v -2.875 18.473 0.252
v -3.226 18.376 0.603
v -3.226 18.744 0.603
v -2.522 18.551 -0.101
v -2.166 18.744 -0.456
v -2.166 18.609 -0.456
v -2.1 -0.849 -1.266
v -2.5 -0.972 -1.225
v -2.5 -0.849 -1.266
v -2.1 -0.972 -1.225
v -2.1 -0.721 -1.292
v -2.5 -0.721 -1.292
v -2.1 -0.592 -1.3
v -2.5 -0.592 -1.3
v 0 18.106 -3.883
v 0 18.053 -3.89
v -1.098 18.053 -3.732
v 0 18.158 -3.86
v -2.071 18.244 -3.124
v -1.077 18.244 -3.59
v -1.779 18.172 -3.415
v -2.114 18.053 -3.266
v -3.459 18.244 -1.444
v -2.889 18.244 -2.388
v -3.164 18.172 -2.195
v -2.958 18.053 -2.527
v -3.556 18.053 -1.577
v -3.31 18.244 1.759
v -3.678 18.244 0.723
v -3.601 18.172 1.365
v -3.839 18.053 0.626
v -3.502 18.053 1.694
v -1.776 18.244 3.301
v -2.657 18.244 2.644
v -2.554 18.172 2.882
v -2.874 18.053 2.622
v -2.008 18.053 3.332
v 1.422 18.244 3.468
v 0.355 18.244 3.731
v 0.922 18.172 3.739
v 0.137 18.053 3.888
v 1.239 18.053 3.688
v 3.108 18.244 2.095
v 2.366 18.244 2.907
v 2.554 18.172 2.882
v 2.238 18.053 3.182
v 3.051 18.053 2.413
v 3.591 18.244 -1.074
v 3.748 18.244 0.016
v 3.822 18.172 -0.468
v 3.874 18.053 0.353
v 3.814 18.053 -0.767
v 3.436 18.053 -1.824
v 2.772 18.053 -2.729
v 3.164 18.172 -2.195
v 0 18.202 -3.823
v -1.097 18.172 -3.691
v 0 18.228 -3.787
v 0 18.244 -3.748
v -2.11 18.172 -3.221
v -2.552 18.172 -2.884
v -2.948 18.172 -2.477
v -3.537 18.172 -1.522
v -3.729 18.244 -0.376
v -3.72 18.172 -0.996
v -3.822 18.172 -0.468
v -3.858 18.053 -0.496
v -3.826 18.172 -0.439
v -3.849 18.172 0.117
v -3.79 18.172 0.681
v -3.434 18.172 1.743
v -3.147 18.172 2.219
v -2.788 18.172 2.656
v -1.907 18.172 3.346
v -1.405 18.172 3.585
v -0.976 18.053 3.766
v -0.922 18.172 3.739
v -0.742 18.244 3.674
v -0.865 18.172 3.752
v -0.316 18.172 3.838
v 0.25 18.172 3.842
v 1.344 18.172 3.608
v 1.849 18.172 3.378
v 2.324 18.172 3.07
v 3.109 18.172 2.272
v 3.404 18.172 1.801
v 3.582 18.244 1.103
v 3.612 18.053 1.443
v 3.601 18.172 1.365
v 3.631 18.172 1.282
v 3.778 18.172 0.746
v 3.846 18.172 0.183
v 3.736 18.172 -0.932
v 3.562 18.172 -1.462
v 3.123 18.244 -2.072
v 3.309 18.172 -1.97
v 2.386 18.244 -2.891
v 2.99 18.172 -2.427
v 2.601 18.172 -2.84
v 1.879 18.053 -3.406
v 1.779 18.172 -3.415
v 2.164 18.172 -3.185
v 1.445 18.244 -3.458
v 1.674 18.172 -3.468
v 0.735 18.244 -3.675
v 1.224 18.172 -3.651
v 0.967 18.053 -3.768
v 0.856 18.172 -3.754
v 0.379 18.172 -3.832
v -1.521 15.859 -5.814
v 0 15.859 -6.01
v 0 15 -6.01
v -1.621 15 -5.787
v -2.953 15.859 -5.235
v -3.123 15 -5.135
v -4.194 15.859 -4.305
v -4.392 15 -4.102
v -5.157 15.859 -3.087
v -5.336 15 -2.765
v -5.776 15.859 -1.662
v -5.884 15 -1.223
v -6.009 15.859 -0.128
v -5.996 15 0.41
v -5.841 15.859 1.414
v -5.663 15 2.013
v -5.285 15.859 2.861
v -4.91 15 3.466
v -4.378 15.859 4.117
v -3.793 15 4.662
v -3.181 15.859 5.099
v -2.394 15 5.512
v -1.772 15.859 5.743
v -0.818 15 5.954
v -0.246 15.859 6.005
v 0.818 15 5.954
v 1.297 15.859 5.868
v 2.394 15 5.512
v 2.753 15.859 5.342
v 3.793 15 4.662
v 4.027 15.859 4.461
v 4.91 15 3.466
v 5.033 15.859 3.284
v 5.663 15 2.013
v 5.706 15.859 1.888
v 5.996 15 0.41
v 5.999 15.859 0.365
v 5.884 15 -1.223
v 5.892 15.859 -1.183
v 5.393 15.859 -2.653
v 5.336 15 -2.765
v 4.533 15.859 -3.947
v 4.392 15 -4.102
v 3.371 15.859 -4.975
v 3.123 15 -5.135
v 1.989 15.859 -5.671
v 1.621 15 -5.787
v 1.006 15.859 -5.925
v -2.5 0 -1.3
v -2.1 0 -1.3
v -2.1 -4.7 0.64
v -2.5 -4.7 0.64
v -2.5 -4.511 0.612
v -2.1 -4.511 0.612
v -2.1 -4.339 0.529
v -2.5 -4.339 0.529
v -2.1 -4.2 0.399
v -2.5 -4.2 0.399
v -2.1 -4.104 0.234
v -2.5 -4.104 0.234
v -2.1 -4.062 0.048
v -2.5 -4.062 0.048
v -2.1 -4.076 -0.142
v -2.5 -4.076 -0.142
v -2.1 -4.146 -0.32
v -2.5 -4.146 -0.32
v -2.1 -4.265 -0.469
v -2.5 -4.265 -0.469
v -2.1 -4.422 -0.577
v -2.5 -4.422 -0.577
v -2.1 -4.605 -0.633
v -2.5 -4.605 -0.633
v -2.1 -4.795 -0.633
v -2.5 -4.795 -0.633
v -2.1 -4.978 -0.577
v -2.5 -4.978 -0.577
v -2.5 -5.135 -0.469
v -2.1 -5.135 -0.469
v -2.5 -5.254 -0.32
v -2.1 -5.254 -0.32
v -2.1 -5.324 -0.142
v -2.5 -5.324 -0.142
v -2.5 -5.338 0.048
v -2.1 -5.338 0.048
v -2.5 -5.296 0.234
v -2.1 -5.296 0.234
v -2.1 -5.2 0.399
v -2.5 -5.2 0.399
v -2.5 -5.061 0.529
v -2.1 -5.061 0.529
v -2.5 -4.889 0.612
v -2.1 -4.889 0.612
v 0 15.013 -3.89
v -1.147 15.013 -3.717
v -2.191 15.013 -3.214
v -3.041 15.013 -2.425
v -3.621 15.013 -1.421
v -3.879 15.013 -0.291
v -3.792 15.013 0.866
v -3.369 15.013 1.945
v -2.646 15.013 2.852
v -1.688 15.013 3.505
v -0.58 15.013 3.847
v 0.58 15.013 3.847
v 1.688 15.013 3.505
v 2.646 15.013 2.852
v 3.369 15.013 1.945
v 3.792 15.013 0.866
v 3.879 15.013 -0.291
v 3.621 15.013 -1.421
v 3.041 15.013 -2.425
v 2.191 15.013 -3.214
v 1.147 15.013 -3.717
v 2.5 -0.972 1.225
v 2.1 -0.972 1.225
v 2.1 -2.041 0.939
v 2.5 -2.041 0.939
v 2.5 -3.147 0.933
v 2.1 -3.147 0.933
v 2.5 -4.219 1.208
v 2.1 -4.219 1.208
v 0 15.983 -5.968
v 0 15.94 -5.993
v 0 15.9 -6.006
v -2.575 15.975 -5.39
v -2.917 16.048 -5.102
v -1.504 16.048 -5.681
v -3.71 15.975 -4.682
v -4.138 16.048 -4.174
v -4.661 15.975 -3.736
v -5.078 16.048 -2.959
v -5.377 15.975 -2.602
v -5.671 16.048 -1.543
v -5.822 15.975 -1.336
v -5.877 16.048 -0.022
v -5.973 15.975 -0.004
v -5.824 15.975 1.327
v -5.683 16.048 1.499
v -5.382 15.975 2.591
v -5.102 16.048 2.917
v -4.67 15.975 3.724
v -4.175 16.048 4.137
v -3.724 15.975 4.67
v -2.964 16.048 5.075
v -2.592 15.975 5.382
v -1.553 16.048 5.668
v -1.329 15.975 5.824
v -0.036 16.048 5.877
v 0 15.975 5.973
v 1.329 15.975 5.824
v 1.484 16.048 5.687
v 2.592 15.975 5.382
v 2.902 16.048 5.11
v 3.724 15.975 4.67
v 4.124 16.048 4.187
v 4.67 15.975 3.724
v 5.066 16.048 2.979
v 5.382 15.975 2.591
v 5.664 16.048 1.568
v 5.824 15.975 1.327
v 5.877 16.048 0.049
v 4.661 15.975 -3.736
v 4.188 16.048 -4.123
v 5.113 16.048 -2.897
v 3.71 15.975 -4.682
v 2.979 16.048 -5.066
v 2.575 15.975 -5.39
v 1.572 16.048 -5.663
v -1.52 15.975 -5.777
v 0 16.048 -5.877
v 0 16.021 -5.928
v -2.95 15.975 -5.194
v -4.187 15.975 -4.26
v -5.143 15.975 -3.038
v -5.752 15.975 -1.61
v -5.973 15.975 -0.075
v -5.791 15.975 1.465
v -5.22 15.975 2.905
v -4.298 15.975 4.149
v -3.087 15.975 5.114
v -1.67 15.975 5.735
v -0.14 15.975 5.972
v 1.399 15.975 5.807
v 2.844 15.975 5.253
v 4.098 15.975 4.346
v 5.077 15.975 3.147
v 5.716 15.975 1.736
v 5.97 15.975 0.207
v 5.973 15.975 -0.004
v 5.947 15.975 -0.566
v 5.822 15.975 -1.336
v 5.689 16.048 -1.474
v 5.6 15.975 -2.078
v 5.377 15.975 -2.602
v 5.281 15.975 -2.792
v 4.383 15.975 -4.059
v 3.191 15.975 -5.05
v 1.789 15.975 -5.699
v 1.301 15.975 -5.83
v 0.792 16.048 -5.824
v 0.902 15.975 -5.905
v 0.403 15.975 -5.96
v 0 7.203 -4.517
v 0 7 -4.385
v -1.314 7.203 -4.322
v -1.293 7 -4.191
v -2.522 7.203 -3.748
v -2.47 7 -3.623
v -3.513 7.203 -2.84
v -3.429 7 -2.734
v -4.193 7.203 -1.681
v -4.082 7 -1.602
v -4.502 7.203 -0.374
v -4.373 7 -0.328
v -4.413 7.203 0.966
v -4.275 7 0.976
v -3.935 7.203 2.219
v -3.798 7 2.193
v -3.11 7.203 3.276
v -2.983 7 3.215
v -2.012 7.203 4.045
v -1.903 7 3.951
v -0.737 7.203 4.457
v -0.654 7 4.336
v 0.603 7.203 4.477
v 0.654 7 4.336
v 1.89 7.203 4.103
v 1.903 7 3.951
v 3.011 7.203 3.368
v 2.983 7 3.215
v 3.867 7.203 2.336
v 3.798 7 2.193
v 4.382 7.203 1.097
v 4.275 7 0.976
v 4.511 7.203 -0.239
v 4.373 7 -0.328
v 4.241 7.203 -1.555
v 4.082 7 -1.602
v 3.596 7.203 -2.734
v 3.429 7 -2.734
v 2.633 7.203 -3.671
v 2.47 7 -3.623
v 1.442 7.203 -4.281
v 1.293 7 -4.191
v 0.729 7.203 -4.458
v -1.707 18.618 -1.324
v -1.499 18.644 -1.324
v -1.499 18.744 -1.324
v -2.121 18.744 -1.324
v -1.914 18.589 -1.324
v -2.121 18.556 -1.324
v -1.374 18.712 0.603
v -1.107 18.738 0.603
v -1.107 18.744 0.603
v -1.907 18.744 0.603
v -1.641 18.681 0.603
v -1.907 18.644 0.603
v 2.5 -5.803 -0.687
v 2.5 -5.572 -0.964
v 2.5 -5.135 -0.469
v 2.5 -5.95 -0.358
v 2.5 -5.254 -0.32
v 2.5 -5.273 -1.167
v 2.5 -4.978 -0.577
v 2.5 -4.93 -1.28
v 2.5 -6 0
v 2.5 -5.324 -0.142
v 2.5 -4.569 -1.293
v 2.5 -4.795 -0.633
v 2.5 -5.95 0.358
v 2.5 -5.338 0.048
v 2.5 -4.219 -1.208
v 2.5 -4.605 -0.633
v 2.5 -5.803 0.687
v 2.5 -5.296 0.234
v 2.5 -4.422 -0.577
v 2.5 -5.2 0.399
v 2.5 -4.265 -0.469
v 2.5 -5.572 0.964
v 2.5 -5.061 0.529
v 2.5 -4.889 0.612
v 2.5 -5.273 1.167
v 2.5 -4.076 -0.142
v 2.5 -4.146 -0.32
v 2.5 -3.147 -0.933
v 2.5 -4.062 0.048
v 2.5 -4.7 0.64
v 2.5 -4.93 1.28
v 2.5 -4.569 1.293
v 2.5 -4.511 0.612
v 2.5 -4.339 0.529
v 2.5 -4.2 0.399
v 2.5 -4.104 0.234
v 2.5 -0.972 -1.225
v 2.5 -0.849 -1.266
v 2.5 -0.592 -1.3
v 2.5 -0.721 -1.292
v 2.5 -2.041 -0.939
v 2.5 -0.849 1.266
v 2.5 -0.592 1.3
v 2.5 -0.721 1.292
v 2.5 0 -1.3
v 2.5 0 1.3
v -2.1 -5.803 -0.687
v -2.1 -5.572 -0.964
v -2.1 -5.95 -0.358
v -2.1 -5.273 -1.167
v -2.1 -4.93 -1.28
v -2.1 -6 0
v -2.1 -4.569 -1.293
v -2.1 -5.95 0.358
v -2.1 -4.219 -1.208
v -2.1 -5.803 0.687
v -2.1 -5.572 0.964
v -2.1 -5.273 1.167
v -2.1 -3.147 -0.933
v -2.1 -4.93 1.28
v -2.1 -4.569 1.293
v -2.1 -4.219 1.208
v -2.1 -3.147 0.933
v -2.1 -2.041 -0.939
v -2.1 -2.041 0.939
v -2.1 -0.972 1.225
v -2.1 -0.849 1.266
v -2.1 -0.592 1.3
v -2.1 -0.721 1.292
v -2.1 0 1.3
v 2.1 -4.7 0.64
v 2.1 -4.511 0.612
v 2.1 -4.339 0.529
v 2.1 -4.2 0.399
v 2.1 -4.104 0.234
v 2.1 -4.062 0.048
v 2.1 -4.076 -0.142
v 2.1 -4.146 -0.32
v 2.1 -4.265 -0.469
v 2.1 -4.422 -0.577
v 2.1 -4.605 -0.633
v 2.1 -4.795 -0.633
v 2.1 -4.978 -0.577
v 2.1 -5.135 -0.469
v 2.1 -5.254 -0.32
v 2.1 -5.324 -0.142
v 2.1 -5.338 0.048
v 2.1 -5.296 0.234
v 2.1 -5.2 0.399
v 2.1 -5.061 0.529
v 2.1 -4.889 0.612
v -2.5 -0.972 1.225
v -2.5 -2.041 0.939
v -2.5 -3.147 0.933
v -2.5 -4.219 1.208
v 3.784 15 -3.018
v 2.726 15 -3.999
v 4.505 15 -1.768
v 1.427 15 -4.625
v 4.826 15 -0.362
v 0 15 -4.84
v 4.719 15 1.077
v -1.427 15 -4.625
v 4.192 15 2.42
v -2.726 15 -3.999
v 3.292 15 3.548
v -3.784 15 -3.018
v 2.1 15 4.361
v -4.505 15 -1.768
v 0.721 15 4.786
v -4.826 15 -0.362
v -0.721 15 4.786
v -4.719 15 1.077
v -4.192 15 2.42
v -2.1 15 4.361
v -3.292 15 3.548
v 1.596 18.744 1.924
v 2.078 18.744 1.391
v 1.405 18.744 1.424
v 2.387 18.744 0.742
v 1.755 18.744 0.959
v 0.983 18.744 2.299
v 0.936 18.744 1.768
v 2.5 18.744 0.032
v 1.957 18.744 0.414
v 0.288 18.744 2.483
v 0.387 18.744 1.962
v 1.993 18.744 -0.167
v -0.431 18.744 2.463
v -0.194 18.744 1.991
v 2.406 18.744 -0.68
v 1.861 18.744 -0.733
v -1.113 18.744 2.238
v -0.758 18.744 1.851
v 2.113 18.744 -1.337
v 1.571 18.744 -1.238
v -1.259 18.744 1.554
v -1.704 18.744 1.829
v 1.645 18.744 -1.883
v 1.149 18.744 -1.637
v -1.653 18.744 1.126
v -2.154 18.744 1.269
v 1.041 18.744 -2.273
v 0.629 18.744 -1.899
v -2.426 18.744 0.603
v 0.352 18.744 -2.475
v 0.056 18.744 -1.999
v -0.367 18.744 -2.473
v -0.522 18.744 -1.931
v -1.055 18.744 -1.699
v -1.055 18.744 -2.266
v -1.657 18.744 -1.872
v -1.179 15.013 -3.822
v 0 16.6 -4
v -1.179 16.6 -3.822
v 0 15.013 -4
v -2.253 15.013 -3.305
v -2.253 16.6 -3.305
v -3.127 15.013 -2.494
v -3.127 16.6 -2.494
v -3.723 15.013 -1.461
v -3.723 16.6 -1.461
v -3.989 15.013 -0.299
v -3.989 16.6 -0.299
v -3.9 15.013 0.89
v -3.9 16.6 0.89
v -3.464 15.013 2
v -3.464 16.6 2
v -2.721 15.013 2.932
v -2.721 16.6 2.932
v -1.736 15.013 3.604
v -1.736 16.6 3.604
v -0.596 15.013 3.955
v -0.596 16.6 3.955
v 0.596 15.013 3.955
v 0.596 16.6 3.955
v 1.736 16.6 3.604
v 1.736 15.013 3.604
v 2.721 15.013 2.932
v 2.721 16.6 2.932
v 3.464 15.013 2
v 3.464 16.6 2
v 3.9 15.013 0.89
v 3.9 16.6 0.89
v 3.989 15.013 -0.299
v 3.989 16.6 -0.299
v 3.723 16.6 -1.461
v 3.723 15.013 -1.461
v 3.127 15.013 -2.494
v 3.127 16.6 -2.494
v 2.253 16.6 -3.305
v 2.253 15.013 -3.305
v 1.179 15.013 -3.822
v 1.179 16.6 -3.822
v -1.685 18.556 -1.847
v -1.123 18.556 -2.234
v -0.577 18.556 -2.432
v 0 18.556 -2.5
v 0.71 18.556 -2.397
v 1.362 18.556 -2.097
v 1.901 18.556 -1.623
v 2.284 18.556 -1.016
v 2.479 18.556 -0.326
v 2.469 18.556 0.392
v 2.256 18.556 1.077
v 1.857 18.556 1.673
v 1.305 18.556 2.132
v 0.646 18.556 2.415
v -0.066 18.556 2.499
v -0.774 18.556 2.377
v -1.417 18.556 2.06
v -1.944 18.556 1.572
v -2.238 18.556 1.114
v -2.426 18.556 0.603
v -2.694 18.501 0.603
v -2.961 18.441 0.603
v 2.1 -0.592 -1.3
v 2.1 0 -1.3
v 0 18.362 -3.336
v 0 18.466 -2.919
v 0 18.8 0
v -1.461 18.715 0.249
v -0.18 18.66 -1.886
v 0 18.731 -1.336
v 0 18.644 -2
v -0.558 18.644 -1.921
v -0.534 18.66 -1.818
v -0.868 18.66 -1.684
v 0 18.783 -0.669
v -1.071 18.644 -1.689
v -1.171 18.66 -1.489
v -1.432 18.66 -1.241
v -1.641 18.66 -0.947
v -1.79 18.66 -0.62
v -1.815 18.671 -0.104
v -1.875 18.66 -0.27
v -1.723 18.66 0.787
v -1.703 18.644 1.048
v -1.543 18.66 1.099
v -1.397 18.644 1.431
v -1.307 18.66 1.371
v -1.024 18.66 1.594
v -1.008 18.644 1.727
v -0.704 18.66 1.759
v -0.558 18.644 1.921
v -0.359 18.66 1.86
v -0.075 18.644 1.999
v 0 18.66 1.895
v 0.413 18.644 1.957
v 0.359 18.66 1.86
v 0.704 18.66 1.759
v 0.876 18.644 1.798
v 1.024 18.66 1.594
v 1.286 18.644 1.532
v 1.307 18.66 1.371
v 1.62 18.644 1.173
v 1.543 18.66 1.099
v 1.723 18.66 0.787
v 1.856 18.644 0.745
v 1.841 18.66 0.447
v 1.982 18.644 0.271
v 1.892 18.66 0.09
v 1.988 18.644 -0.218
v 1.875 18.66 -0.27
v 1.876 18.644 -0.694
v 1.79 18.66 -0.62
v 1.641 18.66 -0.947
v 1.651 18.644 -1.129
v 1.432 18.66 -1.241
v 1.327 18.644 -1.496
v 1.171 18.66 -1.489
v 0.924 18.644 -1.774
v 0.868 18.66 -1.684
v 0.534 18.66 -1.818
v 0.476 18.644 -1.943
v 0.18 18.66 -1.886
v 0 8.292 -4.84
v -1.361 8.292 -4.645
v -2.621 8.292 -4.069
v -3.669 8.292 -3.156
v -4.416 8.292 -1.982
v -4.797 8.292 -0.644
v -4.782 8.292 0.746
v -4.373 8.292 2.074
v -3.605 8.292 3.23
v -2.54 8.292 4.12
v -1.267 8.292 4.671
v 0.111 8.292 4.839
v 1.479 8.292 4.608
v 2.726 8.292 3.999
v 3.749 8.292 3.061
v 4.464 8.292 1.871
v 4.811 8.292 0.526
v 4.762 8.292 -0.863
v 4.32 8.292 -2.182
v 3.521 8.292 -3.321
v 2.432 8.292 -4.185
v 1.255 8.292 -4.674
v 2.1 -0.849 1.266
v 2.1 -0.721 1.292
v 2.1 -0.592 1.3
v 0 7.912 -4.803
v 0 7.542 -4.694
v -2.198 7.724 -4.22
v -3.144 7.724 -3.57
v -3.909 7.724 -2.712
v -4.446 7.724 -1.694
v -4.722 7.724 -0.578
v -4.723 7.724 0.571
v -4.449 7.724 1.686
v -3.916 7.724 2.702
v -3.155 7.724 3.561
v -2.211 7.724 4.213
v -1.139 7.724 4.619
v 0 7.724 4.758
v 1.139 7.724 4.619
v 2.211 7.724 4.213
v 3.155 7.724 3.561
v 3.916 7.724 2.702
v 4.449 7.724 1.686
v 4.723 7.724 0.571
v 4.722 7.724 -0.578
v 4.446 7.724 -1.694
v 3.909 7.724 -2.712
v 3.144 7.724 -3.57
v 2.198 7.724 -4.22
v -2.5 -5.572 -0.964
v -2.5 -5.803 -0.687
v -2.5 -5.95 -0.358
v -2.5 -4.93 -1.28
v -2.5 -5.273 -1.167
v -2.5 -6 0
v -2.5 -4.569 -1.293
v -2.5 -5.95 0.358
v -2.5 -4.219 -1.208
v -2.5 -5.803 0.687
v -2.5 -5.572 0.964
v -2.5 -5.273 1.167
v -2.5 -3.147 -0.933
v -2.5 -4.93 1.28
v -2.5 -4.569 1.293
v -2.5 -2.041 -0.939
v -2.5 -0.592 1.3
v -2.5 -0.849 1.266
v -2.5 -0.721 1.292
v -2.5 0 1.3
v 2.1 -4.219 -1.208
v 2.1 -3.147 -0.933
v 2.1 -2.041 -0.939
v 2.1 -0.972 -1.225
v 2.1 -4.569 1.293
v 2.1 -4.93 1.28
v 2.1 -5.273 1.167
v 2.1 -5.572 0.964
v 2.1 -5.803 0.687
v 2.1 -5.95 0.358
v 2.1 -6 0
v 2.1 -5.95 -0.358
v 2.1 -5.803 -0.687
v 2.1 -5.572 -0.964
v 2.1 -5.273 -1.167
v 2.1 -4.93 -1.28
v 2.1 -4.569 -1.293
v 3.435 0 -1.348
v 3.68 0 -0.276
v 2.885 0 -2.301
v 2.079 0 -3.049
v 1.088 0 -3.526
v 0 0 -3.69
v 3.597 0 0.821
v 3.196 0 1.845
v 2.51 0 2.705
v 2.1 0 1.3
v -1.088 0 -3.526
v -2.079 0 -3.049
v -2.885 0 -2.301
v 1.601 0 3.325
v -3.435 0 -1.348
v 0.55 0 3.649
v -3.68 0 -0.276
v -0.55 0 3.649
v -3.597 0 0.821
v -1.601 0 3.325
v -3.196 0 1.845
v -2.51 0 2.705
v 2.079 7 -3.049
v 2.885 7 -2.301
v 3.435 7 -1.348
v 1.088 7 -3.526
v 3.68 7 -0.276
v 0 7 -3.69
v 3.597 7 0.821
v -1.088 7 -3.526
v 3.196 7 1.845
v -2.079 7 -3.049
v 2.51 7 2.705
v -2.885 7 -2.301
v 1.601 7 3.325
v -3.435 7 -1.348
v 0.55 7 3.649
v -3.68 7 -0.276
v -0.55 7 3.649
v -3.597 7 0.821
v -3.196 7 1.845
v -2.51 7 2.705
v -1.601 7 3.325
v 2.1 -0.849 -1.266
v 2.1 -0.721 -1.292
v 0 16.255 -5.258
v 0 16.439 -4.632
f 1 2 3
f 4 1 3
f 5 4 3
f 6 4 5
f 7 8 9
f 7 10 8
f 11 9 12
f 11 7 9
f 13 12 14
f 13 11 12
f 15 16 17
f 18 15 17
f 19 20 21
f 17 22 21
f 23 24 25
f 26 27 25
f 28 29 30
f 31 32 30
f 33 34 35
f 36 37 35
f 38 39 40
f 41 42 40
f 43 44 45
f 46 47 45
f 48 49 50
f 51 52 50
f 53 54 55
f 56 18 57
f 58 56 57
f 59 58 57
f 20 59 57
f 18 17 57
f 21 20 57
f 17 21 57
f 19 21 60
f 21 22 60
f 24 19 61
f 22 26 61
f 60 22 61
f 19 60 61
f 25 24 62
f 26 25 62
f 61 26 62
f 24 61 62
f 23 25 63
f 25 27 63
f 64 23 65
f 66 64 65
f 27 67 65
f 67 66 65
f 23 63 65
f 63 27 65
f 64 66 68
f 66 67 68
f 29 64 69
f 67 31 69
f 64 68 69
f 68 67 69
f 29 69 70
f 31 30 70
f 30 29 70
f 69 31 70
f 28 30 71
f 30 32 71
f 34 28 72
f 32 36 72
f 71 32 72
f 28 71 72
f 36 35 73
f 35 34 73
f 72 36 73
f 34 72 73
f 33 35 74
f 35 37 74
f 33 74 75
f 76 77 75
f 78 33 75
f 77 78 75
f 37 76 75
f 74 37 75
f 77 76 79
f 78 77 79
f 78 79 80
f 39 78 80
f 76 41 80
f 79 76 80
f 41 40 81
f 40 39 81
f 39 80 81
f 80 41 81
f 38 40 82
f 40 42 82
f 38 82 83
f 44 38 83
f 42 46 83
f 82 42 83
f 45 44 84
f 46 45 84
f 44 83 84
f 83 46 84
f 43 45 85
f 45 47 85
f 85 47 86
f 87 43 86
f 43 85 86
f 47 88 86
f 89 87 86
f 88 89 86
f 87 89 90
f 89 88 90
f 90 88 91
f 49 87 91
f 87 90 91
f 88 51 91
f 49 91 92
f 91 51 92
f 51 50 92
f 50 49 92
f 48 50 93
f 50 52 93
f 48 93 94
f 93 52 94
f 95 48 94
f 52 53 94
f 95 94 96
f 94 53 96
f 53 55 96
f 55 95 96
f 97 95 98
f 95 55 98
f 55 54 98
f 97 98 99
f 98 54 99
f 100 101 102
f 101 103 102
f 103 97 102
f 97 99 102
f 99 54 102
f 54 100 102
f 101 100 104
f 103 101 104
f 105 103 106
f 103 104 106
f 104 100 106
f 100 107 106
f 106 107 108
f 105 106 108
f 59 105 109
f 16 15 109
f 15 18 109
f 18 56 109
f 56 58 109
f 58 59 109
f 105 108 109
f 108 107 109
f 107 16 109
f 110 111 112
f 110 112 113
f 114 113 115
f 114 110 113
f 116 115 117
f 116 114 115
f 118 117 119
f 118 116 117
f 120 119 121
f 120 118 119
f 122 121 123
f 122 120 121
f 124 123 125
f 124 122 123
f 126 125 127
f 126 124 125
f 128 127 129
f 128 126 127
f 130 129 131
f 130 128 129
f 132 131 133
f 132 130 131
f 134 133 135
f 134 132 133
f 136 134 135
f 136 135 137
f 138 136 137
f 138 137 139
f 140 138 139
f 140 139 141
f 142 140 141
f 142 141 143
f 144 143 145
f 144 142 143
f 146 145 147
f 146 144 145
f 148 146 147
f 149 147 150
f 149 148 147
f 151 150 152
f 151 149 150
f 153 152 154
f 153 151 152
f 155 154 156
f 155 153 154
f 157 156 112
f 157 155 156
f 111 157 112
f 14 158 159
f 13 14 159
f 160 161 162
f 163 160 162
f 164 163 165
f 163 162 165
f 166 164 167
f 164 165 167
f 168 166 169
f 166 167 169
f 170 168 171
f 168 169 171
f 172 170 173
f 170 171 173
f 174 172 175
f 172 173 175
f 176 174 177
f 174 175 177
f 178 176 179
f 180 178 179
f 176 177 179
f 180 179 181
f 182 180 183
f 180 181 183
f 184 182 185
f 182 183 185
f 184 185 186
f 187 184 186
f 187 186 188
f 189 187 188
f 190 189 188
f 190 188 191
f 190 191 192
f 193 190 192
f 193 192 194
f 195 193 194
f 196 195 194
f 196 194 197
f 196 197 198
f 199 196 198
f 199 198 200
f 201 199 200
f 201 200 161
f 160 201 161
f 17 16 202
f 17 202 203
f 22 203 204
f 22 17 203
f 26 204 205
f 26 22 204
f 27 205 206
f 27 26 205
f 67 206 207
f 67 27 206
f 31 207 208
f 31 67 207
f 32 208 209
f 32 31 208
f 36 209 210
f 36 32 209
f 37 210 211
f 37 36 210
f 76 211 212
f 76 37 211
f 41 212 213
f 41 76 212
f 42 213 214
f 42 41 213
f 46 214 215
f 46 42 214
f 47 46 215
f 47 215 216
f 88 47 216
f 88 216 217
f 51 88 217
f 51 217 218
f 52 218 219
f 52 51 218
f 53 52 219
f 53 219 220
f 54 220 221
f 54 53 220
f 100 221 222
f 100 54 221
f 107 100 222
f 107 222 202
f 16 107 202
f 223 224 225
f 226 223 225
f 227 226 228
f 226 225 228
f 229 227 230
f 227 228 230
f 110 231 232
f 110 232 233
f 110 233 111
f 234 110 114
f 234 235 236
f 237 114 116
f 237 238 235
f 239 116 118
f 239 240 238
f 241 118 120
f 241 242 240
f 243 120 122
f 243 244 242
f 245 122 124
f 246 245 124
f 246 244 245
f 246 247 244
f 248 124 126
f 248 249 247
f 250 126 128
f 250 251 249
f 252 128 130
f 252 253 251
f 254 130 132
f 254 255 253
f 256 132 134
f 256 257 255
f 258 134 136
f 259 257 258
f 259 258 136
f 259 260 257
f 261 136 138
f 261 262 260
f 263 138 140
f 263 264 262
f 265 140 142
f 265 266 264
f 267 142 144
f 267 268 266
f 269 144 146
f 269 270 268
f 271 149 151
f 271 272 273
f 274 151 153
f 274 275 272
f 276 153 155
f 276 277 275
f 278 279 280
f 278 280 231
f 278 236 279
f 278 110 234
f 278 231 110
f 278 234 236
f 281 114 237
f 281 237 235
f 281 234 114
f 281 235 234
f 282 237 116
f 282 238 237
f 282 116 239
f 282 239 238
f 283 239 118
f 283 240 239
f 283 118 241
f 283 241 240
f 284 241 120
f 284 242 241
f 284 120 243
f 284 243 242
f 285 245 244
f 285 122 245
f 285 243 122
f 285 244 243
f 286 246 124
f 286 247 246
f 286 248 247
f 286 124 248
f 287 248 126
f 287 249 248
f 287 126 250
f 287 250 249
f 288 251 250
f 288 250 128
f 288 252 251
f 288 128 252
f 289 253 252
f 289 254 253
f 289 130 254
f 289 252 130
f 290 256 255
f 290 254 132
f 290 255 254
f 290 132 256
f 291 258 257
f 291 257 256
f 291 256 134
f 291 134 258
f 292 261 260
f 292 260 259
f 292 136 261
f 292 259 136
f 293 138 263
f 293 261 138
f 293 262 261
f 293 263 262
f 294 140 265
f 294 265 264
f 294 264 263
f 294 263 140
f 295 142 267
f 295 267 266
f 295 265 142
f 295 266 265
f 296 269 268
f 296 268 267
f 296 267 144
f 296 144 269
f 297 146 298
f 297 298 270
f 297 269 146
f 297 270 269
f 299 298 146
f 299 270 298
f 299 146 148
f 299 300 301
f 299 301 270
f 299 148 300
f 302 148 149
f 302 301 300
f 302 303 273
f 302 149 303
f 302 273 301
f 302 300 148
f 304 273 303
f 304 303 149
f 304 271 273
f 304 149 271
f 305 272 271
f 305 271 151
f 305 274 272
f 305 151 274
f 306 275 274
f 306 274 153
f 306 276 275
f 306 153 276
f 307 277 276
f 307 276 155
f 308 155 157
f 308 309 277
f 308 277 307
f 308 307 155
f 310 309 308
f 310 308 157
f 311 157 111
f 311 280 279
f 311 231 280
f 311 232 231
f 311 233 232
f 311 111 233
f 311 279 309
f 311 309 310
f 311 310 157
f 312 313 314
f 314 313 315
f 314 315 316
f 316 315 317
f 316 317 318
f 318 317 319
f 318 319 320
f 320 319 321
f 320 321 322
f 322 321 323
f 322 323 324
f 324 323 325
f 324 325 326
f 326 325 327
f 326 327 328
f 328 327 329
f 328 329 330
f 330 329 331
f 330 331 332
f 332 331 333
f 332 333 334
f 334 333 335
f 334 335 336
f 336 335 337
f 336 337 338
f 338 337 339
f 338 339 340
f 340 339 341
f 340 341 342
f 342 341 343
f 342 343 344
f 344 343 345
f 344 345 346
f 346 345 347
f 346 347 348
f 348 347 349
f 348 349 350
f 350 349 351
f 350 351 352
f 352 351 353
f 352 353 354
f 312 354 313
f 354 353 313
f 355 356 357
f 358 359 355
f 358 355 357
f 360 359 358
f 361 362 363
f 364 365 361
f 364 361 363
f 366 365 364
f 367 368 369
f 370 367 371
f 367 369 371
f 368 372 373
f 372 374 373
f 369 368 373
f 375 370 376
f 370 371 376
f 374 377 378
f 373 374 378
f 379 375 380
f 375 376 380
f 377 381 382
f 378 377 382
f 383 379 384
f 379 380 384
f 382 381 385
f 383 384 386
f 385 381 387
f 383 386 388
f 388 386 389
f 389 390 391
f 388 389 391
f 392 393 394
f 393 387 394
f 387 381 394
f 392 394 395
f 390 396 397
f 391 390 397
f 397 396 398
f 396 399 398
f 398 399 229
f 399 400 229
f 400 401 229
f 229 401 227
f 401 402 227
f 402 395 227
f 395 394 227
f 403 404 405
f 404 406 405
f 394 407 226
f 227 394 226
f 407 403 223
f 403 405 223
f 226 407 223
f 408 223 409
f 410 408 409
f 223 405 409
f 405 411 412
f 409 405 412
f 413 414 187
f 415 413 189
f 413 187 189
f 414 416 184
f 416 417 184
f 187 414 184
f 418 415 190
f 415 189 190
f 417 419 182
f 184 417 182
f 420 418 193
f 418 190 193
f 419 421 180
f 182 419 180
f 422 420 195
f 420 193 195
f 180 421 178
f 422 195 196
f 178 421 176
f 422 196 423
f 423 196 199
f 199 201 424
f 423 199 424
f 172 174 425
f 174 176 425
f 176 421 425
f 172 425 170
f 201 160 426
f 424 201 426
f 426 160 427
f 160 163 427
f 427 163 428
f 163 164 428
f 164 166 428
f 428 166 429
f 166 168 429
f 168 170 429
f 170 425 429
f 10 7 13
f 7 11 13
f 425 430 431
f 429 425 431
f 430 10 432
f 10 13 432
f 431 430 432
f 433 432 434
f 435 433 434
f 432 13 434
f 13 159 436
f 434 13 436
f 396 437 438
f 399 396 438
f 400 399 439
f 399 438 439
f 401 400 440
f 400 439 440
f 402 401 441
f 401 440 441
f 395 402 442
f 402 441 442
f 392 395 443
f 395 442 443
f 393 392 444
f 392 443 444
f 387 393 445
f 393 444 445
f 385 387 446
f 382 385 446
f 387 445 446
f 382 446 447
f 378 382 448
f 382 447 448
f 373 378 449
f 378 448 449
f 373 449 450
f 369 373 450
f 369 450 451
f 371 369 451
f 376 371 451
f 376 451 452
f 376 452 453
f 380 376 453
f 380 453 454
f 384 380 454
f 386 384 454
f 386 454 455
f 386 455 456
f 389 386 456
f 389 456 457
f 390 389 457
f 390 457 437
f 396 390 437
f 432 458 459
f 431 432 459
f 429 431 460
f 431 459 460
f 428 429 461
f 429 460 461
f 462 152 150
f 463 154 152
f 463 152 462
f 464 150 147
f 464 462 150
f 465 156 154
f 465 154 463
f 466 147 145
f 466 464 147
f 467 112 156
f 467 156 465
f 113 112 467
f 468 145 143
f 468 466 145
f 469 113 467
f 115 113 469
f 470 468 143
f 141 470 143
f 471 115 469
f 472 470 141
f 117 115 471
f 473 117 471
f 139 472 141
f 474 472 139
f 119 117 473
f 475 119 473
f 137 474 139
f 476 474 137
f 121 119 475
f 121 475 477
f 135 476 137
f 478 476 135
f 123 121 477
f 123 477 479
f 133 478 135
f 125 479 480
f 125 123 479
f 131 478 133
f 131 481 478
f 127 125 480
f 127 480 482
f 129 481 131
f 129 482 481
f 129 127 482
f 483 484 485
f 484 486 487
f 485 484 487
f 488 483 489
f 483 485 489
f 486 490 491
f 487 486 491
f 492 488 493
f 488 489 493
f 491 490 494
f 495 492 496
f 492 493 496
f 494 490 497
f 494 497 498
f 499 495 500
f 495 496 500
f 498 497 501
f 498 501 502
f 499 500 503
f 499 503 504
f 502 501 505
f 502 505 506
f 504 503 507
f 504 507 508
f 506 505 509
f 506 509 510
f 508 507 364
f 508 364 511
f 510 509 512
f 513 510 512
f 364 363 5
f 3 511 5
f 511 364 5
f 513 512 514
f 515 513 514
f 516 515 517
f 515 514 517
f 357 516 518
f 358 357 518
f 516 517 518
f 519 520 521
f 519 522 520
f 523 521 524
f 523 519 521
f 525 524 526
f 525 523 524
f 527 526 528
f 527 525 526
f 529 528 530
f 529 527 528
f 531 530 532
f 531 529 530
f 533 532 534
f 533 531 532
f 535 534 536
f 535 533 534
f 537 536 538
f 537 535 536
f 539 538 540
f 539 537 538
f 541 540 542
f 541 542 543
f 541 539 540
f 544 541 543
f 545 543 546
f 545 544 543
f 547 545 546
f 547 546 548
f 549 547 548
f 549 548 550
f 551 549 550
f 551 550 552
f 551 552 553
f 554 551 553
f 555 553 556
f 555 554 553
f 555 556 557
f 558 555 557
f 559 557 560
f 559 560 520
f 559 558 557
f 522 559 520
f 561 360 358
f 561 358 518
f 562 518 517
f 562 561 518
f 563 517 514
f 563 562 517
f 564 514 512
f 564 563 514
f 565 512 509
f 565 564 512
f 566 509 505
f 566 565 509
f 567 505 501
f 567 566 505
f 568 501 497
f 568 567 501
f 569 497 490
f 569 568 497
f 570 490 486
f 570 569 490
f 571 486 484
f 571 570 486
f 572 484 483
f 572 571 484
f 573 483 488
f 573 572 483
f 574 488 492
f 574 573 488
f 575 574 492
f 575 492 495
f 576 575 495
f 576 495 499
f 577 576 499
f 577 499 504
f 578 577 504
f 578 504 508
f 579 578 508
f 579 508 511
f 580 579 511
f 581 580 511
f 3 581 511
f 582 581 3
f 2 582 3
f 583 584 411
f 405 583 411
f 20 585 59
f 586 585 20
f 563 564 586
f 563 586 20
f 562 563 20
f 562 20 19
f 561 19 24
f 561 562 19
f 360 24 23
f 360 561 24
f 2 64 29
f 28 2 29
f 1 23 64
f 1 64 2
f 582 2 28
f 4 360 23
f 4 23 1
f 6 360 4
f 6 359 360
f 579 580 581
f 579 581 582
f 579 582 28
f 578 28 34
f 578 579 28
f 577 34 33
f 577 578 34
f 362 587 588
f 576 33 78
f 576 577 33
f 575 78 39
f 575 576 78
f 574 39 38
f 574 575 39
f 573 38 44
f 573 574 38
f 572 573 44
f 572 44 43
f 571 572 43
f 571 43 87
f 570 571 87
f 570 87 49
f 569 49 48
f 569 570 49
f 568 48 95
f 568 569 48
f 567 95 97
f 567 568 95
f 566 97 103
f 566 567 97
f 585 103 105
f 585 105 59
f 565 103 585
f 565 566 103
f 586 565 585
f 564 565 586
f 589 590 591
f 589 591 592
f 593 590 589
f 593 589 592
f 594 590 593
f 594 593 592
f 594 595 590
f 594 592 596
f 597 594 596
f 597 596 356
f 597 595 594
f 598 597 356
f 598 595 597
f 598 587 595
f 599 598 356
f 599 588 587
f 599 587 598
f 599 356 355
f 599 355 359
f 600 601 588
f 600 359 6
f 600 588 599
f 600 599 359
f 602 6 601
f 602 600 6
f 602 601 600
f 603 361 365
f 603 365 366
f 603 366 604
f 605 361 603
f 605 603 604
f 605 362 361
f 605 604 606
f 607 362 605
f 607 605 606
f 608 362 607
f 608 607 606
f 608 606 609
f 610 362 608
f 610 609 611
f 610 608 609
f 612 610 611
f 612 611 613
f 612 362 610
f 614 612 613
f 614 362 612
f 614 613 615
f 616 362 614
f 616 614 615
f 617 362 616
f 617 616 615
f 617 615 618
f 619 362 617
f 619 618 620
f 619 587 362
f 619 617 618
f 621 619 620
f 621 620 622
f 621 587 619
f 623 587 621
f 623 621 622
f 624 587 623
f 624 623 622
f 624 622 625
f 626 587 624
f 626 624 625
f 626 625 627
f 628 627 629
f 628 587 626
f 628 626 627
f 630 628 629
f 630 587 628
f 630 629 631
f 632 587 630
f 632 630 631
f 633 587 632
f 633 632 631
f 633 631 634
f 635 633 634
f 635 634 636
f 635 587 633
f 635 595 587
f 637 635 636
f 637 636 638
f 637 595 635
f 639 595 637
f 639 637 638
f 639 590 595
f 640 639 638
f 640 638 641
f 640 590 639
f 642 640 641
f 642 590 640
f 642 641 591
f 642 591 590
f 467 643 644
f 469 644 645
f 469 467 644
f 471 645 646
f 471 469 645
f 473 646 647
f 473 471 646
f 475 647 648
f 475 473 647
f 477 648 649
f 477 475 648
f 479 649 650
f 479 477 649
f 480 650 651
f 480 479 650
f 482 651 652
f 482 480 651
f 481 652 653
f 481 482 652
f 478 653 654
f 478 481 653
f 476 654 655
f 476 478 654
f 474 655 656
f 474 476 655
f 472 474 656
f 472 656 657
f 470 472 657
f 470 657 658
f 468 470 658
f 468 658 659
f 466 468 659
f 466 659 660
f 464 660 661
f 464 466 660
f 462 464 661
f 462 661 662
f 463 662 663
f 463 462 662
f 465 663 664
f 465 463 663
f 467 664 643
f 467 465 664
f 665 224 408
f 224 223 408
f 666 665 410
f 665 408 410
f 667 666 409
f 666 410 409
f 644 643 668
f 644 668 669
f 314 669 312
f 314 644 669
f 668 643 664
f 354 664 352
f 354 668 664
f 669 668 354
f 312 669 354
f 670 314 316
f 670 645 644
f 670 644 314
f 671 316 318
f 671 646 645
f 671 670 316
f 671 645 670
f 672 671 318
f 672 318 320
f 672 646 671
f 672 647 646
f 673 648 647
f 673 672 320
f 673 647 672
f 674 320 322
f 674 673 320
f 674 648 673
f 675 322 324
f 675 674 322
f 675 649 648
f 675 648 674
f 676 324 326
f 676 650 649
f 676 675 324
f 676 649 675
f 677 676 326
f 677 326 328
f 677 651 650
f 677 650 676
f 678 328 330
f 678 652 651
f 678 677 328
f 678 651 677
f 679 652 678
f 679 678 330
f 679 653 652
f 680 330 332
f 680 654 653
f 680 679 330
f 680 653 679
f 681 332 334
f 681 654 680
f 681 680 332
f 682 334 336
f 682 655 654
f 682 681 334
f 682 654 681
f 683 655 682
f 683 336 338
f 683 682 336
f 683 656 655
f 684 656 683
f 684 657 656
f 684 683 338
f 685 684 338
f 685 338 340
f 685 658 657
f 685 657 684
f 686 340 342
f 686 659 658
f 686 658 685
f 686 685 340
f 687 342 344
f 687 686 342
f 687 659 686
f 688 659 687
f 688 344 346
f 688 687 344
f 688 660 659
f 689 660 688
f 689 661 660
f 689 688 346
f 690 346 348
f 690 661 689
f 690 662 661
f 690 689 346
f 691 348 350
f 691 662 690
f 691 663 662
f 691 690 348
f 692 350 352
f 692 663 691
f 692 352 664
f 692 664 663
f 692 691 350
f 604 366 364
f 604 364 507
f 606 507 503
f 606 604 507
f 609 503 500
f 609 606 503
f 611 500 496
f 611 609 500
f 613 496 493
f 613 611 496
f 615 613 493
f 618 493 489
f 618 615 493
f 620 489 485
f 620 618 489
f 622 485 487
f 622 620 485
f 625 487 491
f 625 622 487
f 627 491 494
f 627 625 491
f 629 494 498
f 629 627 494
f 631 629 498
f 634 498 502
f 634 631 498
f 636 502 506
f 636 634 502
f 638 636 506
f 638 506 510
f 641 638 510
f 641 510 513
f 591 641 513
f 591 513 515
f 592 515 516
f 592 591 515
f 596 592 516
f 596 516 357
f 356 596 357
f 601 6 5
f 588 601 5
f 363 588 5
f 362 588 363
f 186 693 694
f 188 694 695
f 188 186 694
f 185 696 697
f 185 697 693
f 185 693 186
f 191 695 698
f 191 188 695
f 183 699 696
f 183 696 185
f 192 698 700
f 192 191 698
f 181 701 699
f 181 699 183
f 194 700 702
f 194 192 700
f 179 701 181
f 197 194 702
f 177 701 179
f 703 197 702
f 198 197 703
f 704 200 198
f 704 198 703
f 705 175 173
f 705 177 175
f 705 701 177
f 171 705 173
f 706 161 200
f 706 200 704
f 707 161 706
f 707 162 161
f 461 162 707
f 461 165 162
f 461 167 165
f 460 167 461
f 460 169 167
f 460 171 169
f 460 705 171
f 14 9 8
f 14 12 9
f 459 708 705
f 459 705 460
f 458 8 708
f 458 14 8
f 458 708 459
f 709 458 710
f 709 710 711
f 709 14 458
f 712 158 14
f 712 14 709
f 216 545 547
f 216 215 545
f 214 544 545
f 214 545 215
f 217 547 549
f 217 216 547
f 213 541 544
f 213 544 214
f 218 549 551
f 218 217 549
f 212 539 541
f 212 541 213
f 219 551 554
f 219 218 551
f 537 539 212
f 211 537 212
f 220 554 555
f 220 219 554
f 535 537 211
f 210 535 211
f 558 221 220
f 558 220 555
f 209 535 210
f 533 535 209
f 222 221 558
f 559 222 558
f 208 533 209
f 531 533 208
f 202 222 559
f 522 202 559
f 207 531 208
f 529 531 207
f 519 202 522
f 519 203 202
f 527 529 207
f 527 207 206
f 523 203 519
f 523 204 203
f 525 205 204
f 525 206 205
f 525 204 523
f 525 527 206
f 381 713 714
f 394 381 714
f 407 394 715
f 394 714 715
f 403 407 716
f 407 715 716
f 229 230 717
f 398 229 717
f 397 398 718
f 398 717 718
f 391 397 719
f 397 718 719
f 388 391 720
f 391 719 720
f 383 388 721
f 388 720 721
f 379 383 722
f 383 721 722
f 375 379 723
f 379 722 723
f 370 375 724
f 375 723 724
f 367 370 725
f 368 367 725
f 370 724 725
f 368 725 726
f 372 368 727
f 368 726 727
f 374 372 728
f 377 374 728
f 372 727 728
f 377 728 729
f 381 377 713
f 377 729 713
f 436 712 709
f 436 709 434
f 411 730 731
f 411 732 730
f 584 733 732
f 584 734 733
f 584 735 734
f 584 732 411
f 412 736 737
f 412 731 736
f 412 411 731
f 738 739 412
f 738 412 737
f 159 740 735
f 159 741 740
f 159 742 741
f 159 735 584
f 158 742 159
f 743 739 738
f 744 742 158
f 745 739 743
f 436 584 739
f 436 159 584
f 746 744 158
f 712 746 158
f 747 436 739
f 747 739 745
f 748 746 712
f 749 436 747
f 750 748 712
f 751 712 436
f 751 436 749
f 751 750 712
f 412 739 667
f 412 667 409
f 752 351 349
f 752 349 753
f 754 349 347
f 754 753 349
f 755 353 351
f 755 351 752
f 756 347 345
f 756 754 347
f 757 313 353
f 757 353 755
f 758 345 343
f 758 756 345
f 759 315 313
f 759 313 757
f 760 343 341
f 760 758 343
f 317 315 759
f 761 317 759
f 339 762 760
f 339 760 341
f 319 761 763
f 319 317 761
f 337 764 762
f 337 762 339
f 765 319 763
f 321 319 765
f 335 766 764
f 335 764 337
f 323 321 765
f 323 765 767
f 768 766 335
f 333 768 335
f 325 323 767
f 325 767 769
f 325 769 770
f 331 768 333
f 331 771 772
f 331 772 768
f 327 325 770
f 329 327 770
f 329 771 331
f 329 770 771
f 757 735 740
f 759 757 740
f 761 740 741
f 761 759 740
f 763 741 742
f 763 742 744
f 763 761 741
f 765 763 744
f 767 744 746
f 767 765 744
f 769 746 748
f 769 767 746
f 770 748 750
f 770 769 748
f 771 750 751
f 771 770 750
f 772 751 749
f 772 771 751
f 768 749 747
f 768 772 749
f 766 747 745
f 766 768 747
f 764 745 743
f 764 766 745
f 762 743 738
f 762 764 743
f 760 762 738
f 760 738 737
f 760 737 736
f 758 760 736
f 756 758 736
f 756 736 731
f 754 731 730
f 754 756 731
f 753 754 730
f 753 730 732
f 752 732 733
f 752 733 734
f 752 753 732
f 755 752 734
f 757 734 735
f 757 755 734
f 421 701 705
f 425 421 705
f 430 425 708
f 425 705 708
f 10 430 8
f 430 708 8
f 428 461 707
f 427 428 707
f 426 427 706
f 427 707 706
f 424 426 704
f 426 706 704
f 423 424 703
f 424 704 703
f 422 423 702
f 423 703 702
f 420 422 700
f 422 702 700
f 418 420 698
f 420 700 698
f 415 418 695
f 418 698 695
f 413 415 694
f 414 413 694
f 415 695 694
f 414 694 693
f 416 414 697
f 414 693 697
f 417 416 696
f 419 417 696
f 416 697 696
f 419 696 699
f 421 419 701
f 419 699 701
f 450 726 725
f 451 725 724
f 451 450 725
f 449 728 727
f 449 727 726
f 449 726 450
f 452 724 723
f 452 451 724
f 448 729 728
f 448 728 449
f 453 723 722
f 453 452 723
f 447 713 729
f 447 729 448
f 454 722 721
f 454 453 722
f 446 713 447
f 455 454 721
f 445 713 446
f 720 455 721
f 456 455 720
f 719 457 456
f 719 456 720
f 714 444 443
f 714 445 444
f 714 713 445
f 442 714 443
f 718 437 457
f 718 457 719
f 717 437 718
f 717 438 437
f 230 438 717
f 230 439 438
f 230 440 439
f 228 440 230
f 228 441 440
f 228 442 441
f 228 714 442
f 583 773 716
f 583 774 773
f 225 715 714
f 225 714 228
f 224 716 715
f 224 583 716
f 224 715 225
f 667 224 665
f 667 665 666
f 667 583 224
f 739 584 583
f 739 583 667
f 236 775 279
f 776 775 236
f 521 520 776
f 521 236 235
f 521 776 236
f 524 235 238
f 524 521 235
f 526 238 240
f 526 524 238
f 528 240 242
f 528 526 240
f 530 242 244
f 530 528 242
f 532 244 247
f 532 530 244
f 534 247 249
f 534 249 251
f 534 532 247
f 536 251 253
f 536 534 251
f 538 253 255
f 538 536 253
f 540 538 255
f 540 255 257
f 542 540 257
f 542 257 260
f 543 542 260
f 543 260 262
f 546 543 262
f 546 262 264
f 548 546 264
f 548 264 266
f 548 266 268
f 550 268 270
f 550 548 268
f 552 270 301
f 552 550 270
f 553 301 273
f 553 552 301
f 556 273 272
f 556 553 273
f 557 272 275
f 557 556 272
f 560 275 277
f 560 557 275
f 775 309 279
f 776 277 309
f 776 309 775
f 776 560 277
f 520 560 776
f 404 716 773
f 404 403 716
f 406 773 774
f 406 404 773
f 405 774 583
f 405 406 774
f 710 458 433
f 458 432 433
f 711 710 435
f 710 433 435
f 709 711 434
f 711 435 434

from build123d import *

# Parameters (mm, degrees)
CONG_1_R                 = 0.2
CONG_2_R                 = 0.2
CHANFREIN1_SIZE          = 0.7
CHANFREIN1_SIZE2         = 0.454585315
CONG_3_R                 = 2
ESQUISSE2_W              = 0.4
ESQUISSE2_H              = 2.6
BOSS_EXTRU_1_DEPTH       = 6
ESQUISSE3_R              = 0.64
ENL_V_MAT_EXTRU_1_DEPTH  = 6
CONG_4_R                 = 1
RESSALTO_EXTRUS_O1_DEPTH = 0.5


with BuildPart() as part:
    # Esquisse1 → Révolution1 (revolve)
    with BuildSketch(Plane.XY, mode=Mode.PRIVATE) as r_volution1_sk:
        with BuildLine():
            Line((0, 18.8), (0, 0))
            Line((0, 0), (3.69, 0))
            Line((3.69, 0), (3.69, 7))
            Line((3.69, 7), (4.84, 7))
            Line((4.84, 7), (4.84, 15))
            Line((4.84, 15), (6.01, 15))
            Line((6.01, 15), (6.01, 16))
            ThreePointArc((6.01, 16), (5.013982948, 16.330092875), (4, 16.6))
            Line((4, 16.6), (4, 15.013190638))
            Line((4, 15.013190638), (3.89, 15.013190638))
            Line((3.89, 15.013190638), (3.89, 18.2))
            ThreePointArc((3.89, 18.2), (1.968000254, 18.649118314), (0, 18.8))
        make_face()
    revolve(r_volution1_sk.sketch.rotate(Axis((0, 0, 0), (0, 1, 0)), 90), axis=Axis((0, 0, 0), (0, 1, 0)))

    # Congé1
    cong_1_edges = [part.edges().sort_by_distance(p)[0] for p in [
        (0, 18.2, 3.89),
    ]]
    fillet(cong_1_edges, radius=CONG_1_R)

    # Congé2
    cong_2_edges = [part.edges().sort_by_distance(p)[0] for p in [
        (0, 16, 6.01),
    ]]
    fillet(cong_2_edges, radius=CONG_2_R)

    # Chanfrein1
    chanfrein1_edges = [part.edges().sort_by_distance(p)[0] for p in [
        (0, 7, 4.84),
    ]]
    chanfrein1_side = [part.faces().sort_by_distance(p)[0] for p in [
        (0, 11, 4.84),
    ]]
    chamfer(chanfrein1_edges, length=CHANFREIN1_SIZE, length2=CHANFREIN1_SIZE2, reference=chanfrein1_side[0])

    # Congé3
    cong_3_edges = [part.edges().sort_by_distance(p)[0] for p in [
        (0, 7.7, 4.84),
    ]]
    fillet(cong_3_edges, radius=CONG_3_R)

    # Esquisse2 → Boss.-Extru.1 (add)
    with BuildSketch(Plane.XZ):
        with Locations((2.3, 0)):
            Rectangle(ESQUISSE2_W, ESQUISSE2_H)
        with Locations((-2.3, 0)):
            Rectangle(ESQUISSE2_W, ESQUISSE2_H)
    extrude(amount=BOSS_EXTRU_1_DEPTH)

    # Esquisse3 → Enlèv. mat.-Extru.1 (cut)
    with BuildSketch(Plane.ZY.offset(2.5)):
        with Locations((0, -4.7)):
            Circle(ESQUISSE3_R)
        with BuildLine():
            Line((-1.3, -0.8), (-4.192462756, -0.8))
            Line((-4.192462756, -0.8), (-4.192462756, -7.475627282))
            Line((-4.192462756, -7.475627282), (5.572809524, -7.57510374))
            Line((5.572809524, -7.57510374), (5.225347222, -0.8))
            Line((5.225347222, -0.8), (1.3, -0.8))
            ThreePointArc((1.3, -0.8), (0.901580438, -2.499750503), (1.207561262, -4.218548238))
            ThreePointArc((1.207561262, -4.218548238), (0, -6), (-1.207561262, -4.218548238))
            ThreePointArc((-1.207561262, -4.218548238), (-0.901580438, -2.499750503), (-1.3, -0.8))
        make_face()
    extrude(amount=-ENL_V_MAT_EXTRU_1_DEPTH, mode=Mode.SUBTRACT)

    # Congé4
    cong_4_edges = [part.edges().sort_by_distance(p)[0] for p in [
        (-2.3, -0.8, 1.3),
        (-2.3, -0.8, -1.3),
        (2.3, -0.8, -1.3),
        (2.3, -0.8, 1.3),
    ]]
    fillet(cong_4_edges, radius=CONG_4_R)

    # Esboço1 → Ressalto-extrusão1 (add, symmetric)
    with BuildSketch(Plane(origin=(0, 18.243955153, 0), x_dir=(-1, 0, 0), z_dir=(0, -1, 0))):
        with BuildLine():
            Line((1.106856798, -0.603238885), (1.906856798, -0.603238885))
            ThreePointArc((1.906856798, -0.603238885), (-1.956724443, -0.413798809), (1.499383453, 1.323574426))
            Line((1.499383453, 1.323574426), (2.120884424, 1.323574426))
            ThreePointArc((2.120884424, 1.323574426), (-2.469207481, -0.39117057), (2.42612919, -0.603238885))
            Line((2.42612919, -0.603238885), (3.22612919, -0.603238885))
            Line((3.22612919, -0.603238885), (2.166492994, 0.456397311))
            Line((2.166492994, 0.456397311), (1.106856798, -0.603238885))
        make_face()
    extrude(amount=RESSALTO_EXTRUS_O1_DEPTH, both=True)


solid = part.part
